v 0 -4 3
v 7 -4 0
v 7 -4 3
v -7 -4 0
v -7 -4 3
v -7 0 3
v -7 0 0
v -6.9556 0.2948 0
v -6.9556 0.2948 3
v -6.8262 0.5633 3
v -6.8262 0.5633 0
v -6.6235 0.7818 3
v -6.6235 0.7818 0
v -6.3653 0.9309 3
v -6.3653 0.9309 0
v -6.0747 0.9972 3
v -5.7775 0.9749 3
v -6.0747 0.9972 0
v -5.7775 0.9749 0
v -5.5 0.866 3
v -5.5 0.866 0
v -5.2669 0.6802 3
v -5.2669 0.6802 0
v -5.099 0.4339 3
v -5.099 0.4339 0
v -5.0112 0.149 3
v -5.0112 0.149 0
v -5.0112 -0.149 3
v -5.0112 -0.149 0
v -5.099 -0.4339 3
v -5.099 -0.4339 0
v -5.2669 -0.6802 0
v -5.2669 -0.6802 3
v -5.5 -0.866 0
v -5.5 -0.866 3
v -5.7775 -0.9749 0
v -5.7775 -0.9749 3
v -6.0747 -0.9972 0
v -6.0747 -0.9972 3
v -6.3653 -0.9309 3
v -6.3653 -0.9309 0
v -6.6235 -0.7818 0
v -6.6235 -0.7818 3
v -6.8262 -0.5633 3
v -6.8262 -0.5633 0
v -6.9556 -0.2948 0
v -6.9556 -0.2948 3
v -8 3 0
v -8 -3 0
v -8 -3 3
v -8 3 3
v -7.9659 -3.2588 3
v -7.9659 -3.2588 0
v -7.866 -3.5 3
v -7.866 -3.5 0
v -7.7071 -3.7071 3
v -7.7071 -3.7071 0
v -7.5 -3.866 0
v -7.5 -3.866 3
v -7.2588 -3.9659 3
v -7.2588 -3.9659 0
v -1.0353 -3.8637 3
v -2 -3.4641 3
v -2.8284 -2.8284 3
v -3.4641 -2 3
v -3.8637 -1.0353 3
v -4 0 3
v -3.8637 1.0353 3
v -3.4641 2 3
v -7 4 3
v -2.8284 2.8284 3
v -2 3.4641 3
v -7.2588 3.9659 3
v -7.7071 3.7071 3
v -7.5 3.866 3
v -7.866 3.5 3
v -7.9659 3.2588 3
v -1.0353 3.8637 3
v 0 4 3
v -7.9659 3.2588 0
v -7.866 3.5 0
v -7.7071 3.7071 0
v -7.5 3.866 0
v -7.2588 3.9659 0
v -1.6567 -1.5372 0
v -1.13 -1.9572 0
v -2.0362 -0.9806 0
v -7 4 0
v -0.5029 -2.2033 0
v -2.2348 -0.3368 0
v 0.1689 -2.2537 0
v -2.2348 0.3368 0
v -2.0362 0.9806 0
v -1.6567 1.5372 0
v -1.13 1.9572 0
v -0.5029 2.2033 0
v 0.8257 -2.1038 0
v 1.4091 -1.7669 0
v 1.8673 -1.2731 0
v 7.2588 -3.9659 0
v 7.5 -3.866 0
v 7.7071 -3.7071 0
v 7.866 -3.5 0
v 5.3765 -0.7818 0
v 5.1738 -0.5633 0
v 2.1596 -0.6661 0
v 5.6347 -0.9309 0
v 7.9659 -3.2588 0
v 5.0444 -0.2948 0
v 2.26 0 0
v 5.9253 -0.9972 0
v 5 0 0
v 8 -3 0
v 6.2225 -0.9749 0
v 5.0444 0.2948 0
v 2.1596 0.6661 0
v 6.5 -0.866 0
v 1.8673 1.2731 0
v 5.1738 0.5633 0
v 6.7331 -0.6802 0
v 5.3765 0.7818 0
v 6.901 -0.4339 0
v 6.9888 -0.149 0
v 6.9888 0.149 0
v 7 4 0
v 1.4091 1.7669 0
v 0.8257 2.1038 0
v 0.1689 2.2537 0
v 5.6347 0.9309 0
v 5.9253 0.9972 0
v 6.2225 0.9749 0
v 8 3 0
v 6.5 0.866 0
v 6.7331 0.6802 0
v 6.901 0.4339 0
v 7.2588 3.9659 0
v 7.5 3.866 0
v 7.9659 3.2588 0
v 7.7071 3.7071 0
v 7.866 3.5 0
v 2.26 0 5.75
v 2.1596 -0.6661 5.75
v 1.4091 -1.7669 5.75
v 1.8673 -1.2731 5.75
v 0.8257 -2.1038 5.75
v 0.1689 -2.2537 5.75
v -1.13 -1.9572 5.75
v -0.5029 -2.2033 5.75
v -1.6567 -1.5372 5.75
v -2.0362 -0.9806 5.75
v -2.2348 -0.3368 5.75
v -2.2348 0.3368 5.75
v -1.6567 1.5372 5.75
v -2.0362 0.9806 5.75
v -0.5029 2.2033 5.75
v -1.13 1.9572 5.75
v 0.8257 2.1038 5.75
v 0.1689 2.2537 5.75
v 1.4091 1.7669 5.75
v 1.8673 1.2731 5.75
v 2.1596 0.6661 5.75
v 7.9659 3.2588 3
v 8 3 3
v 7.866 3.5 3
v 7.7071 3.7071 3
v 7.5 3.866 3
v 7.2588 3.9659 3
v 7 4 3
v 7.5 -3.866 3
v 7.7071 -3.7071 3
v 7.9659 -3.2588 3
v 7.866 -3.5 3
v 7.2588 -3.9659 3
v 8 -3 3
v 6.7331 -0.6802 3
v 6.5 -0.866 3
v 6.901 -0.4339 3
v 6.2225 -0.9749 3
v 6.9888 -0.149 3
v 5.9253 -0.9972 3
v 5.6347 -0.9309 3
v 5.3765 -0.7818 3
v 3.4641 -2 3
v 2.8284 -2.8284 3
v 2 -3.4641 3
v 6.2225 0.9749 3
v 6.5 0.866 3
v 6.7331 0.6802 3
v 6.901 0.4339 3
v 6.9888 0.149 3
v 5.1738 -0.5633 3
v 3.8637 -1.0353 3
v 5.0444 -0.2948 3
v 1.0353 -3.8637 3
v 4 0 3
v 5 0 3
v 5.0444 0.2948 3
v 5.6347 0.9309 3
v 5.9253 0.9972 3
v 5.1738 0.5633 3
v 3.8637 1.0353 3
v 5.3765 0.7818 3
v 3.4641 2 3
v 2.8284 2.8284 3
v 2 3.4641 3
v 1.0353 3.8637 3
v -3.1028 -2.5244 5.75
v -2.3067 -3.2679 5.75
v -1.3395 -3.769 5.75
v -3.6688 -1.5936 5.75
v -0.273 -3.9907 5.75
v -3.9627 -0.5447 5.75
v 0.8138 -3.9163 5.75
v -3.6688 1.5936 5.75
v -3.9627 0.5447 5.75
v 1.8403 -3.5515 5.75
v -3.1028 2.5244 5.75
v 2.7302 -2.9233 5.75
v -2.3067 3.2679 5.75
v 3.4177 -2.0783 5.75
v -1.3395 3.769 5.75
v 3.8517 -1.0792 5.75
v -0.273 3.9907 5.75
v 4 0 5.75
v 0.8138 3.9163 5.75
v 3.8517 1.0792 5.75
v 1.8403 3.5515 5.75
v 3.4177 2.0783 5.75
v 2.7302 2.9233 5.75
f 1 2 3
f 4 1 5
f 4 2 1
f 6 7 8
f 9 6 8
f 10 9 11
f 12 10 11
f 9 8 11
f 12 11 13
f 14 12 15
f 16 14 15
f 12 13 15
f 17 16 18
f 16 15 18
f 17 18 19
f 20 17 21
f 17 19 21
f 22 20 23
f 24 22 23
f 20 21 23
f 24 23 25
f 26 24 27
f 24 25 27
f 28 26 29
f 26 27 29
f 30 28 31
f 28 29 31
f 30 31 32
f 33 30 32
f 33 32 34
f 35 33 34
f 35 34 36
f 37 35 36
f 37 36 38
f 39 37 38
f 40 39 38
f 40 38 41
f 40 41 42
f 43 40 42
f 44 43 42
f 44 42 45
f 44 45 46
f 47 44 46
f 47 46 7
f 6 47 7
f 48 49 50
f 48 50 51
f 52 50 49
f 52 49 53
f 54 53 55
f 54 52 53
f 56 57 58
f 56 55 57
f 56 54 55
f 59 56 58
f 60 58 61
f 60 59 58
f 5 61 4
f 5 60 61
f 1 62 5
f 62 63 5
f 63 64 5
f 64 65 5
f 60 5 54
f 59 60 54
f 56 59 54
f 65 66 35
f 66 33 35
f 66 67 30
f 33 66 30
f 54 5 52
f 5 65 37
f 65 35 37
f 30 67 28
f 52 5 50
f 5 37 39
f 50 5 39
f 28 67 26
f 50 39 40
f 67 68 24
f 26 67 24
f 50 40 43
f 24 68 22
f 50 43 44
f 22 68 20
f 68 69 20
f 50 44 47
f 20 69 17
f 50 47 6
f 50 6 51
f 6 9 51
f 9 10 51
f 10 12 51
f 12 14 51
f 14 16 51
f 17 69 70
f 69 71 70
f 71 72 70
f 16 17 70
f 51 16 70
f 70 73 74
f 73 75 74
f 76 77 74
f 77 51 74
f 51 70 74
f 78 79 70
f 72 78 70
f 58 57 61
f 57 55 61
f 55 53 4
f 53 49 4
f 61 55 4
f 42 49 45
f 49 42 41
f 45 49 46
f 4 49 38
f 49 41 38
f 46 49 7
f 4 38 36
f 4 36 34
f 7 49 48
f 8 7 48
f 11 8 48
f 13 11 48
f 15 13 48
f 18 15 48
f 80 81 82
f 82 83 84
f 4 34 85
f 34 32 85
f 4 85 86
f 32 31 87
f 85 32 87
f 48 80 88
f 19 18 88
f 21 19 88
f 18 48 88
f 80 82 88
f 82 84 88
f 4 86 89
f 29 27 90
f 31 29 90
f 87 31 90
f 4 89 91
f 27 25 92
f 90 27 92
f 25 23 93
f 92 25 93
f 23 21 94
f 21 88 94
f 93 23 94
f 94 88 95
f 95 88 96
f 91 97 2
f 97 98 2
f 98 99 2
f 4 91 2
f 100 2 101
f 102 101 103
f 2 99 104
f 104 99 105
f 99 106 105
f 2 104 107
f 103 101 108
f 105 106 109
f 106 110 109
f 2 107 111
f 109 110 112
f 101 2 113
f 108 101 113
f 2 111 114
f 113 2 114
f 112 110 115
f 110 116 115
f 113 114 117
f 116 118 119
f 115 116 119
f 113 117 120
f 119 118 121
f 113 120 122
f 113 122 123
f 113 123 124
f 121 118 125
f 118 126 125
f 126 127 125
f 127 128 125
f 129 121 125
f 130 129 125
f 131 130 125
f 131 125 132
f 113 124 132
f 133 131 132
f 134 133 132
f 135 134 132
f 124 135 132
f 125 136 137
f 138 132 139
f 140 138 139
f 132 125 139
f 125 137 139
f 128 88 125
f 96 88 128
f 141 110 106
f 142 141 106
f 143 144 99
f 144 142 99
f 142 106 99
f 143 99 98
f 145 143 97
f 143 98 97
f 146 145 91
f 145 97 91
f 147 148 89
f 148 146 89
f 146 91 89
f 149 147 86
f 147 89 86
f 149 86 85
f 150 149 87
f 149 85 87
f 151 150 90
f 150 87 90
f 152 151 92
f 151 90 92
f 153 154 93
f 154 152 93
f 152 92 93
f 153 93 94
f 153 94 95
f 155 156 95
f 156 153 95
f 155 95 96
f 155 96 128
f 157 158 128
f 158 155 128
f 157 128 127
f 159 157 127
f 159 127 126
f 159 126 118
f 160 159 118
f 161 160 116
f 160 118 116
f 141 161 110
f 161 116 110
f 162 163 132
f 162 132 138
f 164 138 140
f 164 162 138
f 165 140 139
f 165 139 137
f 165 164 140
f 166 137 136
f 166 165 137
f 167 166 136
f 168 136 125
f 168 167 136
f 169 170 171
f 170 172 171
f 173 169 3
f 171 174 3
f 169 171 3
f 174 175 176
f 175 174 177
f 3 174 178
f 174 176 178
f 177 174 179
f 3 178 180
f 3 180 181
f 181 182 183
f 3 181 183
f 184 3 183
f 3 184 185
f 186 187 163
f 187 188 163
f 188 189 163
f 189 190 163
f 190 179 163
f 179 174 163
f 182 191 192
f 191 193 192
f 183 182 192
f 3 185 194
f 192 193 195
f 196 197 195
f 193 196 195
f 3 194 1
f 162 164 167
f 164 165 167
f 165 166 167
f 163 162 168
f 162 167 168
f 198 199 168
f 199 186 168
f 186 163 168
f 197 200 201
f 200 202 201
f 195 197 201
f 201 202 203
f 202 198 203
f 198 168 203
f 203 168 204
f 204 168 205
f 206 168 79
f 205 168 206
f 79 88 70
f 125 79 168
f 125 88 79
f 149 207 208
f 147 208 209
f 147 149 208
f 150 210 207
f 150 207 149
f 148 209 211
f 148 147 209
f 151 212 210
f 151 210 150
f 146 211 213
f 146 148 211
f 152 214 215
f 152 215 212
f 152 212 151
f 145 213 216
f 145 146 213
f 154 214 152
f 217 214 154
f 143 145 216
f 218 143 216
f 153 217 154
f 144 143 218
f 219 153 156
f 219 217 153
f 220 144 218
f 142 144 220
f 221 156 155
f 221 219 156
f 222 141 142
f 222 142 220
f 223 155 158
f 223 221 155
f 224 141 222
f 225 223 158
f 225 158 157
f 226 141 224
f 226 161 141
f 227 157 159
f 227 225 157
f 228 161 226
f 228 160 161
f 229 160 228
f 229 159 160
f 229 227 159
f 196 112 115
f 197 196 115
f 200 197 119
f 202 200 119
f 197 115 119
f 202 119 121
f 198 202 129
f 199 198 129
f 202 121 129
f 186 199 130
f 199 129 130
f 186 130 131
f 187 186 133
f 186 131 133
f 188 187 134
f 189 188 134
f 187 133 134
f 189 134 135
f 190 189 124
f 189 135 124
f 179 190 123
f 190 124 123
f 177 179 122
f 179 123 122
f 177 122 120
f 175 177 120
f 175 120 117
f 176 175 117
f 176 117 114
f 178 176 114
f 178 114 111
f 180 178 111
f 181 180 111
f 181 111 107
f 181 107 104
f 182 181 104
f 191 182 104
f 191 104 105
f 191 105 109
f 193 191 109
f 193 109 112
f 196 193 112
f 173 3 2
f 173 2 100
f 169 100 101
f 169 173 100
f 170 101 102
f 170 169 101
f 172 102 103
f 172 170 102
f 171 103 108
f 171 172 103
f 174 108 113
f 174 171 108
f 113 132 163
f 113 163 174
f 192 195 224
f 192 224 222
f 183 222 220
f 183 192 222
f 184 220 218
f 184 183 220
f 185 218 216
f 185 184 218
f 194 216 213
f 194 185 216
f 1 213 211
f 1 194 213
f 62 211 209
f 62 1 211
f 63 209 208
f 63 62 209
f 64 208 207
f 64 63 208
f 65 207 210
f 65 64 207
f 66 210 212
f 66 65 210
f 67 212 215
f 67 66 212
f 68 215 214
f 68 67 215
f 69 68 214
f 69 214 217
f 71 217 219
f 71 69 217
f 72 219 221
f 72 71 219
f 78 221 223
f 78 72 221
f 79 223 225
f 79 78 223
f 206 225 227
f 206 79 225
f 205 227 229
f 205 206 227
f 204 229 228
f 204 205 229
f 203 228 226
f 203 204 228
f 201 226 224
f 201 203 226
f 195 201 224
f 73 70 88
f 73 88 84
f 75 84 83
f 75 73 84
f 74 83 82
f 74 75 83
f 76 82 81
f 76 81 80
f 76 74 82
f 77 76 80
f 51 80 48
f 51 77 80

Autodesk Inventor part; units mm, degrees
ref_plane "YZ Plane" through (0, 0, 0) normal (1, 0, 0) x (0, 1, 0)
ref_plane "XZ Plane" through (0, 0, 0) normal (0, 1, 0) x (-1, 0, 0)
ref_plane "XY Plane" through (0, 0, 0) normal (0, 0, 1) x (1, 0, 0)
sketch "Sketch1" plane through (0, 0, 0) normal (0, 0, 1) x (1, 0, 0)
  circle A0 centre (0, 0) radius 4
  circle A1 centre (0, 0) radius 2.26
  dimension "d0" = 8
  dimension "d1" = 4.52
extrude "Extrusion1" add sketch "Sketch1" along normal blind 5.75
sketch "Sketch2" plane through (0, 0, 0) normal (0, 0, -1) x (-1, 0, 0)
  circle A0 centre (0, 0) radius 2.26 projected
  circle A1 centre (6, 0) radius 1
  circle A2 centre (-6, 0) radius 1
  line L0 (8, 4) -> (-8, 4)
  line L1 (-8, 4) -> (-8, -4)
  line L2 (-8, -4) -> (8, -4)
  line L3 (8, -4) -> (8, 4)
  line L4 (8, 4) -> (-8, -4) construction
  line L5 (-8, 4) -> (8, -4) construction
  dimension "d7" = 2
  dimension "d8" = 2
  dimension "d9" = 6
  dimension "d10" = 6
  dimension "d11" = 0
  dimension "d12" = 0
  dimension "d19" = 16
  dimension "d20" = 8
extrude "Extrusion2" add sketch "Sketch2" against normal blind 3
fillet "Fillet1" radius 1 4 edges at (8, 4, 1.5) (8, -4, 1.5) (-8, -4, 1.5) (-8, 4, 1.5)
equation "\"d29\" = 55deg"
equation "\"Sketch3_Pitch\" = 0.8"
equation "\"d47\" = 55deg"
equation "\"Sketch5_Pitch\" = 0.4"
equation "\"d65\" = 55deg"
equation "\"Sketch7_Pitch\" = 0.4"
properties part number "M5Nut_Special"
